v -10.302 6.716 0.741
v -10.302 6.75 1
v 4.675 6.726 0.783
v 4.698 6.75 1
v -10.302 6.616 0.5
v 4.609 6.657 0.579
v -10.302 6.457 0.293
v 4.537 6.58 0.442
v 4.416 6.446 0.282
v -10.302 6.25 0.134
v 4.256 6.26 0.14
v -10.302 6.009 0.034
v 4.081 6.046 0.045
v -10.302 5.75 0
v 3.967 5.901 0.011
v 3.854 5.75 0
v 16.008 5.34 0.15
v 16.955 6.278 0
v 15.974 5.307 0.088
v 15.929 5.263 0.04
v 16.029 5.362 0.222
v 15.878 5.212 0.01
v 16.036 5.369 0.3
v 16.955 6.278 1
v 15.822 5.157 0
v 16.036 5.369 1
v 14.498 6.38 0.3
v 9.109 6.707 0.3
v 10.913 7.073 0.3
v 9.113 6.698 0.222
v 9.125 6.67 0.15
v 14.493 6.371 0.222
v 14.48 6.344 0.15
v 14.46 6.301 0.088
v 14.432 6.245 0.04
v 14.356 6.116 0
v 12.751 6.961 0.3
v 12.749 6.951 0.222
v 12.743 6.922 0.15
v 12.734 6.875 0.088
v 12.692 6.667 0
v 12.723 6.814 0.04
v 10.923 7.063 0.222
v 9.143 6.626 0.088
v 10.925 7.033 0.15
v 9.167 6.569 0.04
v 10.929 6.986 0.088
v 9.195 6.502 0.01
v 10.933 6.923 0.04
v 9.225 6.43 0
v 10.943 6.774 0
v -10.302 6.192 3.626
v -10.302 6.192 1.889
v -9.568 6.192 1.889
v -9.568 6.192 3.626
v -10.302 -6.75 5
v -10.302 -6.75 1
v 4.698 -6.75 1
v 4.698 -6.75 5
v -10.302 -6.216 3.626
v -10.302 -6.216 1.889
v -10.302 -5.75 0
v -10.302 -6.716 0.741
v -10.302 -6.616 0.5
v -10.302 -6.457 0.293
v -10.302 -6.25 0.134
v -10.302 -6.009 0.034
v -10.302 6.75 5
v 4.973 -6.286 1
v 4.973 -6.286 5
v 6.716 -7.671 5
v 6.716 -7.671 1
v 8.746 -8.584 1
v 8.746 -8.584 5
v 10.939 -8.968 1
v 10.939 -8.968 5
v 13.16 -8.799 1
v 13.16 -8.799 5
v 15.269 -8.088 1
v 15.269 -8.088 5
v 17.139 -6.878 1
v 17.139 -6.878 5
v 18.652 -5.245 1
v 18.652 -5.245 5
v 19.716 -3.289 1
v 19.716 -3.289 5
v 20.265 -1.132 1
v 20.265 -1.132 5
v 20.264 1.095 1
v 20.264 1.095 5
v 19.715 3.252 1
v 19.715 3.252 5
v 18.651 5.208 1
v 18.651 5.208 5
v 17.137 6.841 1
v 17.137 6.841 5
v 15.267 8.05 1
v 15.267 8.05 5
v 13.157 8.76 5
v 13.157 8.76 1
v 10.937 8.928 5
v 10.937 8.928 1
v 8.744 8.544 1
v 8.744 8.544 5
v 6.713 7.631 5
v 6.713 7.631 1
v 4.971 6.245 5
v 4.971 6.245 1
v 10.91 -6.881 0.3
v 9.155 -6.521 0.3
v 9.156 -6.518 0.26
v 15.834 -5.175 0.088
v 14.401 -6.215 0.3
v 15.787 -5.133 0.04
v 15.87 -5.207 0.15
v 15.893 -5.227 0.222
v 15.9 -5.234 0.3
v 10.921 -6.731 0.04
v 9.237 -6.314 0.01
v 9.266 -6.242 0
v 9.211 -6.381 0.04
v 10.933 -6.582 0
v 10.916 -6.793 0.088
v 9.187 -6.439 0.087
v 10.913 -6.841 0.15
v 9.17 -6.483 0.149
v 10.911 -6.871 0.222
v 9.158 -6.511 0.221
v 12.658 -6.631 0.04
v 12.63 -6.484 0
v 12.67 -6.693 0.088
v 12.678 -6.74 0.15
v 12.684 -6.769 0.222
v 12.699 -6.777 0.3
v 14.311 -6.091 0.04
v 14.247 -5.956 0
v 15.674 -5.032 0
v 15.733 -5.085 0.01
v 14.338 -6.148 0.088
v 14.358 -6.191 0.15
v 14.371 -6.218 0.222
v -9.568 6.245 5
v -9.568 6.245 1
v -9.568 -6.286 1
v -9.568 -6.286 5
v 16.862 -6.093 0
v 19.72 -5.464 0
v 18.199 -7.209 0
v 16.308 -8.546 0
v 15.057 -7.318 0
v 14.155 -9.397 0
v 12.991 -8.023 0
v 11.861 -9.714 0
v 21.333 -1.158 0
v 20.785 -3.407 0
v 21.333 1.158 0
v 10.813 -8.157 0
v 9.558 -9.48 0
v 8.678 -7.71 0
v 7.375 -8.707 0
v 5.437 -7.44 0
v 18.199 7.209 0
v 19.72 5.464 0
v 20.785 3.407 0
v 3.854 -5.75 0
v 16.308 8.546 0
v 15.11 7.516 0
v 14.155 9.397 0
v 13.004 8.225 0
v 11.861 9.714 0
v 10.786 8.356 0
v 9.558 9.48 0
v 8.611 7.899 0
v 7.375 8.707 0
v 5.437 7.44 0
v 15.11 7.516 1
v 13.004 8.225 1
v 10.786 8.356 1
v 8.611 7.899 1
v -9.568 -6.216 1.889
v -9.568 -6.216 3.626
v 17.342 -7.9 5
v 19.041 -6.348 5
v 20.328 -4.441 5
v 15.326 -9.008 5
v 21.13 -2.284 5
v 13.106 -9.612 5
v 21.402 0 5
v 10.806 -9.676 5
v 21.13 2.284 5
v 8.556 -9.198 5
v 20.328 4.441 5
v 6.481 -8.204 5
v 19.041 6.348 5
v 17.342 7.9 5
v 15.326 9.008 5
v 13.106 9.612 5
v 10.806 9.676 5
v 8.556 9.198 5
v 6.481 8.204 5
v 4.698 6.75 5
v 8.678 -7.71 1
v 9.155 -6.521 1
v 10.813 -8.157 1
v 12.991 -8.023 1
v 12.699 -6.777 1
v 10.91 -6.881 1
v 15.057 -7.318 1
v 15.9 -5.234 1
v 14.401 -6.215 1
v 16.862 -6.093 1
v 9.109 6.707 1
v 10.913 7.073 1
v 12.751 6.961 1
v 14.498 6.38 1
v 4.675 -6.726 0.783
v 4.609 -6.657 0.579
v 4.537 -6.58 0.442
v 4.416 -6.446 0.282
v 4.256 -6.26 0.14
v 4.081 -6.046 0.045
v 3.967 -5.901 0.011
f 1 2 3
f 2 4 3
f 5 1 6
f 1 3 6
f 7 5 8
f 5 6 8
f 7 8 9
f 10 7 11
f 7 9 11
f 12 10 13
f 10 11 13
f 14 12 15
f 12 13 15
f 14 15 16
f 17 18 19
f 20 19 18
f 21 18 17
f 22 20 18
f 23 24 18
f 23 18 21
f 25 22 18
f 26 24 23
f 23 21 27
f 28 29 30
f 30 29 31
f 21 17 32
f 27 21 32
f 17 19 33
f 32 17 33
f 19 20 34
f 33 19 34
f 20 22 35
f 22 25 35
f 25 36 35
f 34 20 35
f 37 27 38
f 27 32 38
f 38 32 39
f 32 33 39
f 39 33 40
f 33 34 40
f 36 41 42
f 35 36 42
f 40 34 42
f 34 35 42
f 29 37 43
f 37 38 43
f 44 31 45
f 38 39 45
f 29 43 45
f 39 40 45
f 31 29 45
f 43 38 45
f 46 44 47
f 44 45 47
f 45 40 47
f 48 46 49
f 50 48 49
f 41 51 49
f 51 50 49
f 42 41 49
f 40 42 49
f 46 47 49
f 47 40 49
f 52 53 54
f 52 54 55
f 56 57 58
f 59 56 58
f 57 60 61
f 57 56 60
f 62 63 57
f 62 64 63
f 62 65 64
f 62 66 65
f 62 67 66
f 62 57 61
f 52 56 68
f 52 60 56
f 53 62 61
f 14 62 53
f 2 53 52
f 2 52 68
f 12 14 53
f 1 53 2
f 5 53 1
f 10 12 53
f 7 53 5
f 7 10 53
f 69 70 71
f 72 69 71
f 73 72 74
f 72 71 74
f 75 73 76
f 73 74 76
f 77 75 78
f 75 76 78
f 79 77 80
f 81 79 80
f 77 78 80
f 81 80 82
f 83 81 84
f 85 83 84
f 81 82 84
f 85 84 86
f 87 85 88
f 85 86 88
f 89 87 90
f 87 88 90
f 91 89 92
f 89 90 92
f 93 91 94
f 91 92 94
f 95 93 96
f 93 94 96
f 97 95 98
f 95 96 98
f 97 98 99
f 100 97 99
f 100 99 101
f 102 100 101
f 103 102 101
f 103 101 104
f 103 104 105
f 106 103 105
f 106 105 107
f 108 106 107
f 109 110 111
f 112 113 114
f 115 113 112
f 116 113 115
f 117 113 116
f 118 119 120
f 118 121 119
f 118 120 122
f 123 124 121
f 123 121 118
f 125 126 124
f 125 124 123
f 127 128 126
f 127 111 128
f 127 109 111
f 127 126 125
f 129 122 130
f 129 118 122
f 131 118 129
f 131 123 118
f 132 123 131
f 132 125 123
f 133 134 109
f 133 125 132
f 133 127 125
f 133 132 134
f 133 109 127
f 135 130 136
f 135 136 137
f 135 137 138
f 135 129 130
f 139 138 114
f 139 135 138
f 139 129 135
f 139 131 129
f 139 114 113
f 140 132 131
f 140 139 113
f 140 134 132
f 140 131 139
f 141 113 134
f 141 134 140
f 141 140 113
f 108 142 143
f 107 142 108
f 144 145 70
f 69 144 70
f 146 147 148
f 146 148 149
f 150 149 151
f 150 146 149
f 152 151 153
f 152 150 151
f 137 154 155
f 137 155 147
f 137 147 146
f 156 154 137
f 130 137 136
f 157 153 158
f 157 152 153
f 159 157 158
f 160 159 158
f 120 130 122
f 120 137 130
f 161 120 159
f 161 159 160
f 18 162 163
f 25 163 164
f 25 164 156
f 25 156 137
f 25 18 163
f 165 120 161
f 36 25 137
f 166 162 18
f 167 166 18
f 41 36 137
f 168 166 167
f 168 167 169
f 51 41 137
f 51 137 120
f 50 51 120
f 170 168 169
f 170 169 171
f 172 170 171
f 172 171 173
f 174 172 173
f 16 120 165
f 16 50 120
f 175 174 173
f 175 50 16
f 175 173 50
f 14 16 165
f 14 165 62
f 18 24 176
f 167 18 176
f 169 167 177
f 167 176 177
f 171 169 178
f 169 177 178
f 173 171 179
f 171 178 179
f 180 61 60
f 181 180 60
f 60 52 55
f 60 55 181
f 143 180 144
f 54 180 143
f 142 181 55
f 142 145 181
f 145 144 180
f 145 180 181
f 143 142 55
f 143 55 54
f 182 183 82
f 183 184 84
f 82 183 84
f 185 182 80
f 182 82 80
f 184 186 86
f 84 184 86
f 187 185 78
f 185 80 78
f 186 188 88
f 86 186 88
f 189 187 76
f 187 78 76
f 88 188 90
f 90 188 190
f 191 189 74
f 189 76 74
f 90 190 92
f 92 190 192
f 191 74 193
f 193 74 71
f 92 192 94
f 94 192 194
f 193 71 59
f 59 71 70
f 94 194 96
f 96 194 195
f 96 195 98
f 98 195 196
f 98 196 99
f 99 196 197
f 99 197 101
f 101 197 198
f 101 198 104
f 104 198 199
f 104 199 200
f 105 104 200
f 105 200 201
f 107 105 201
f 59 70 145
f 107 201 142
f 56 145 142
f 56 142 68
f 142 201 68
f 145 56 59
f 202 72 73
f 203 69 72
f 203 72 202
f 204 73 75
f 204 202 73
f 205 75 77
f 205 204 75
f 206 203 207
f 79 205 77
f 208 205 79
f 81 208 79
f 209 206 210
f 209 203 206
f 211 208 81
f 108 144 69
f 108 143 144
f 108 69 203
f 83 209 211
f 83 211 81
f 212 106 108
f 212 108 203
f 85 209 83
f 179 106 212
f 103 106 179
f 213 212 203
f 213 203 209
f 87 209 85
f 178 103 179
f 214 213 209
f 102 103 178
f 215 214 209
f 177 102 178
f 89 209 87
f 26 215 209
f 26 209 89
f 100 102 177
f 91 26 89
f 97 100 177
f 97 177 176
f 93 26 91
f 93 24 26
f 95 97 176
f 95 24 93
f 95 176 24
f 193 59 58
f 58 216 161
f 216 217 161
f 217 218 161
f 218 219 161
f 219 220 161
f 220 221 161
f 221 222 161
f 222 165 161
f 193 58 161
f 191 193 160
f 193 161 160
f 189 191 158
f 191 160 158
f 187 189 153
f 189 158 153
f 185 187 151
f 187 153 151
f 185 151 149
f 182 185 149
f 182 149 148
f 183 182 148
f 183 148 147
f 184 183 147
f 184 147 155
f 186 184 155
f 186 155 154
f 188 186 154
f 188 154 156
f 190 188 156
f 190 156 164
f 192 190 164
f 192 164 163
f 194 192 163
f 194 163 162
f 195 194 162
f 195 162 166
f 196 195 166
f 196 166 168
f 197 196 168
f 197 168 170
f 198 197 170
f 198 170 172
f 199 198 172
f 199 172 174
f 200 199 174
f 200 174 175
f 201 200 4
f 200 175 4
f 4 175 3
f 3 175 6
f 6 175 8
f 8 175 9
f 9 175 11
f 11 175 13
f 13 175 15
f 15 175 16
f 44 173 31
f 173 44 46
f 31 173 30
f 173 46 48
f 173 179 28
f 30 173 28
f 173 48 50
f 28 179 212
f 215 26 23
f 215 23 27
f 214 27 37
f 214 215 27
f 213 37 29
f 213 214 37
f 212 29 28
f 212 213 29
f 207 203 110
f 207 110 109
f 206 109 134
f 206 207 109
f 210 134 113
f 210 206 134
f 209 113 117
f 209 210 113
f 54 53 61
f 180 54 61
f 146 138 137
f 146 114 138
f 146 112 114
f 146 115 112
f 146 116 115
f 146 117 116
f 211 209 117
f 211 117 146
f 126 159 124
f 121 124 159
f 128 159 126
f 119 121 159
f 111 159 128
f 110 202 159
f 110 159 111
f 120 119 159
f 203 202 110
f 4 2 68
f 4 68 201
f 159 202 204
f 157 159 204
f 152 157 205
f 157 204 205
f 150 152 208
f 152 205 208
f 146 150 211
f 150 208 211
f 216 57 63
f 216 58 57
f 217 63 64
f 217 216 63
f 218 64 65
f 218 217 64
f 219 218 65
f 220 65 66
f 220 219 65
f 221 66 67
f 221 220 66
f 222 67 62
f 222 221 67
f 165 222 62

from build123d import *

# Parameters (mm, degrees)
PAD_DEPTH       = 5
POCKET_DEPTH    = 4
POCKET004_DEPTH = 5
FILLET_R        = 1
FILLET001_R     = 1
FILLET002_R     = 0.3
FILLET003_R     = 0.3
SKETCH012_W     = 12.408569
SKETCH012_H     = 1.7372
POCKET007_DEPTH = 2


with BuildPart() as part:
    # Sketch → Pad (new body)
    with BuildSketch(Plane.XY):
        with BuildLine():
            Line((-10.302154, -6.75), (-10.302154, 6.75))
            Line((-10.302154, 6.75), (4.697846, 6.75))
            ThreePointArc((4.697846, -6.75), (21.401934, 0), (4.697846, 6.75))
            Line((-10.302154, -6.75), (4.697846, -6.75))
        make_face()
    extrude(amount=PAD_DEPTH)

    # Sketch001 (on Face6 of Pad) → Pocket (cut)
    with BuildSketch(Plane.XY.offset(5)):
        with BuildLine():
            Line((-9.568426, -6.285917), (4.972526, -6.285917))
            ThreePointArc((4.972526, -6.285917), (20.334041, -0.01843), (4.970857, 6.244966))
            Line((-9.568426, 6.244966), (4.970857, 6.244966))
            Line((-9.568426, -6.285917), (-9.568426, 6.244966))
        make_face()
    extrude(amount=-POCKET_DEPTH, mode=Mode.SUBTRACT)

    # Sketch010 (on Face11 of Pocket) → Pocket004 (cut)
    with BuildSketch(Plane.XY.offset(1)):
        with BuildLine():
            ThreePointArc((16.954988, 6.278391), (13.004004, 8.225263), (8.611476, 7.899254))
            Line((8.611476, 7.899254), (9.109037, 6.707427))
            ThreePointArc((16.036381, 5.369056), (12.751013, 6.961134), (9.109037, 6.707427))
            Line((16.954988, 6.278391), (16.036381, 5.369056))
        make_face()
        with BuildLine():
            ThreePointArc((8.677646, -7.709712), (12.991395, -8.023159), (16.861761, -6.092627))
            Line((15.900234, -5.234123), (16.861761, -6.092627))
            ThreePointArc((9.154517, -6.521003), (12.69888, -6.776571), (15.900234, -5.234123))
            Line((8.677646, -7.709712), (9.154517, -6.521003))
        make_face()
    extrude(amount=-POCKET004_DEPTH, mode=Mode.SUBTRACT)

    # Fillet
    fillet_edges = [part.edges().sort_by_distance(p)[0] for p in [
        (-2.802154, -6.75, 0),
    ]]
    fillet(fillet_edges, radius=FILLET_R)

    # Fillet001
    fillet001_edges = [part.edges().sort_by_distance(p)[0] for p in [
        (-2.802154, 6.75, 0),
    ]]
    fillet(fillet001_edges, radius=FILLET001_R)

    # Fillet002
    fillet002_edges = [part.edges().sort_by_distance(p)[0] for p in [
        (12.751013, 6.961134, 0),
    ]]
    fillet(fillet002_edges, radius=FILLET002_R)

    # Fillet003
    fillet003_edges = [part.edges().sort_by_distance(p)[0] for p in [
        (12.69888, -6.776571, 0),
    ]]
    fillet(fillet003_edges, radius=FILLET003_R)

    # Sketch012 (on Face10 of Fillet003) → Pocket007 (cut)
    with BuildSketch(Plane(origin=(-10.302154, 0, 0), x_dir=(0, -1, 0), z_dir=(-1, 0, 0))):
        with Locations((0.011792, 2.757287)):
            Rectangle(SKETCH012_W, SKETCH012_H)
    extrude(amount=-POCKET007_DEPTH, mode=Mode.SUBTRACT)


solid = part.part
